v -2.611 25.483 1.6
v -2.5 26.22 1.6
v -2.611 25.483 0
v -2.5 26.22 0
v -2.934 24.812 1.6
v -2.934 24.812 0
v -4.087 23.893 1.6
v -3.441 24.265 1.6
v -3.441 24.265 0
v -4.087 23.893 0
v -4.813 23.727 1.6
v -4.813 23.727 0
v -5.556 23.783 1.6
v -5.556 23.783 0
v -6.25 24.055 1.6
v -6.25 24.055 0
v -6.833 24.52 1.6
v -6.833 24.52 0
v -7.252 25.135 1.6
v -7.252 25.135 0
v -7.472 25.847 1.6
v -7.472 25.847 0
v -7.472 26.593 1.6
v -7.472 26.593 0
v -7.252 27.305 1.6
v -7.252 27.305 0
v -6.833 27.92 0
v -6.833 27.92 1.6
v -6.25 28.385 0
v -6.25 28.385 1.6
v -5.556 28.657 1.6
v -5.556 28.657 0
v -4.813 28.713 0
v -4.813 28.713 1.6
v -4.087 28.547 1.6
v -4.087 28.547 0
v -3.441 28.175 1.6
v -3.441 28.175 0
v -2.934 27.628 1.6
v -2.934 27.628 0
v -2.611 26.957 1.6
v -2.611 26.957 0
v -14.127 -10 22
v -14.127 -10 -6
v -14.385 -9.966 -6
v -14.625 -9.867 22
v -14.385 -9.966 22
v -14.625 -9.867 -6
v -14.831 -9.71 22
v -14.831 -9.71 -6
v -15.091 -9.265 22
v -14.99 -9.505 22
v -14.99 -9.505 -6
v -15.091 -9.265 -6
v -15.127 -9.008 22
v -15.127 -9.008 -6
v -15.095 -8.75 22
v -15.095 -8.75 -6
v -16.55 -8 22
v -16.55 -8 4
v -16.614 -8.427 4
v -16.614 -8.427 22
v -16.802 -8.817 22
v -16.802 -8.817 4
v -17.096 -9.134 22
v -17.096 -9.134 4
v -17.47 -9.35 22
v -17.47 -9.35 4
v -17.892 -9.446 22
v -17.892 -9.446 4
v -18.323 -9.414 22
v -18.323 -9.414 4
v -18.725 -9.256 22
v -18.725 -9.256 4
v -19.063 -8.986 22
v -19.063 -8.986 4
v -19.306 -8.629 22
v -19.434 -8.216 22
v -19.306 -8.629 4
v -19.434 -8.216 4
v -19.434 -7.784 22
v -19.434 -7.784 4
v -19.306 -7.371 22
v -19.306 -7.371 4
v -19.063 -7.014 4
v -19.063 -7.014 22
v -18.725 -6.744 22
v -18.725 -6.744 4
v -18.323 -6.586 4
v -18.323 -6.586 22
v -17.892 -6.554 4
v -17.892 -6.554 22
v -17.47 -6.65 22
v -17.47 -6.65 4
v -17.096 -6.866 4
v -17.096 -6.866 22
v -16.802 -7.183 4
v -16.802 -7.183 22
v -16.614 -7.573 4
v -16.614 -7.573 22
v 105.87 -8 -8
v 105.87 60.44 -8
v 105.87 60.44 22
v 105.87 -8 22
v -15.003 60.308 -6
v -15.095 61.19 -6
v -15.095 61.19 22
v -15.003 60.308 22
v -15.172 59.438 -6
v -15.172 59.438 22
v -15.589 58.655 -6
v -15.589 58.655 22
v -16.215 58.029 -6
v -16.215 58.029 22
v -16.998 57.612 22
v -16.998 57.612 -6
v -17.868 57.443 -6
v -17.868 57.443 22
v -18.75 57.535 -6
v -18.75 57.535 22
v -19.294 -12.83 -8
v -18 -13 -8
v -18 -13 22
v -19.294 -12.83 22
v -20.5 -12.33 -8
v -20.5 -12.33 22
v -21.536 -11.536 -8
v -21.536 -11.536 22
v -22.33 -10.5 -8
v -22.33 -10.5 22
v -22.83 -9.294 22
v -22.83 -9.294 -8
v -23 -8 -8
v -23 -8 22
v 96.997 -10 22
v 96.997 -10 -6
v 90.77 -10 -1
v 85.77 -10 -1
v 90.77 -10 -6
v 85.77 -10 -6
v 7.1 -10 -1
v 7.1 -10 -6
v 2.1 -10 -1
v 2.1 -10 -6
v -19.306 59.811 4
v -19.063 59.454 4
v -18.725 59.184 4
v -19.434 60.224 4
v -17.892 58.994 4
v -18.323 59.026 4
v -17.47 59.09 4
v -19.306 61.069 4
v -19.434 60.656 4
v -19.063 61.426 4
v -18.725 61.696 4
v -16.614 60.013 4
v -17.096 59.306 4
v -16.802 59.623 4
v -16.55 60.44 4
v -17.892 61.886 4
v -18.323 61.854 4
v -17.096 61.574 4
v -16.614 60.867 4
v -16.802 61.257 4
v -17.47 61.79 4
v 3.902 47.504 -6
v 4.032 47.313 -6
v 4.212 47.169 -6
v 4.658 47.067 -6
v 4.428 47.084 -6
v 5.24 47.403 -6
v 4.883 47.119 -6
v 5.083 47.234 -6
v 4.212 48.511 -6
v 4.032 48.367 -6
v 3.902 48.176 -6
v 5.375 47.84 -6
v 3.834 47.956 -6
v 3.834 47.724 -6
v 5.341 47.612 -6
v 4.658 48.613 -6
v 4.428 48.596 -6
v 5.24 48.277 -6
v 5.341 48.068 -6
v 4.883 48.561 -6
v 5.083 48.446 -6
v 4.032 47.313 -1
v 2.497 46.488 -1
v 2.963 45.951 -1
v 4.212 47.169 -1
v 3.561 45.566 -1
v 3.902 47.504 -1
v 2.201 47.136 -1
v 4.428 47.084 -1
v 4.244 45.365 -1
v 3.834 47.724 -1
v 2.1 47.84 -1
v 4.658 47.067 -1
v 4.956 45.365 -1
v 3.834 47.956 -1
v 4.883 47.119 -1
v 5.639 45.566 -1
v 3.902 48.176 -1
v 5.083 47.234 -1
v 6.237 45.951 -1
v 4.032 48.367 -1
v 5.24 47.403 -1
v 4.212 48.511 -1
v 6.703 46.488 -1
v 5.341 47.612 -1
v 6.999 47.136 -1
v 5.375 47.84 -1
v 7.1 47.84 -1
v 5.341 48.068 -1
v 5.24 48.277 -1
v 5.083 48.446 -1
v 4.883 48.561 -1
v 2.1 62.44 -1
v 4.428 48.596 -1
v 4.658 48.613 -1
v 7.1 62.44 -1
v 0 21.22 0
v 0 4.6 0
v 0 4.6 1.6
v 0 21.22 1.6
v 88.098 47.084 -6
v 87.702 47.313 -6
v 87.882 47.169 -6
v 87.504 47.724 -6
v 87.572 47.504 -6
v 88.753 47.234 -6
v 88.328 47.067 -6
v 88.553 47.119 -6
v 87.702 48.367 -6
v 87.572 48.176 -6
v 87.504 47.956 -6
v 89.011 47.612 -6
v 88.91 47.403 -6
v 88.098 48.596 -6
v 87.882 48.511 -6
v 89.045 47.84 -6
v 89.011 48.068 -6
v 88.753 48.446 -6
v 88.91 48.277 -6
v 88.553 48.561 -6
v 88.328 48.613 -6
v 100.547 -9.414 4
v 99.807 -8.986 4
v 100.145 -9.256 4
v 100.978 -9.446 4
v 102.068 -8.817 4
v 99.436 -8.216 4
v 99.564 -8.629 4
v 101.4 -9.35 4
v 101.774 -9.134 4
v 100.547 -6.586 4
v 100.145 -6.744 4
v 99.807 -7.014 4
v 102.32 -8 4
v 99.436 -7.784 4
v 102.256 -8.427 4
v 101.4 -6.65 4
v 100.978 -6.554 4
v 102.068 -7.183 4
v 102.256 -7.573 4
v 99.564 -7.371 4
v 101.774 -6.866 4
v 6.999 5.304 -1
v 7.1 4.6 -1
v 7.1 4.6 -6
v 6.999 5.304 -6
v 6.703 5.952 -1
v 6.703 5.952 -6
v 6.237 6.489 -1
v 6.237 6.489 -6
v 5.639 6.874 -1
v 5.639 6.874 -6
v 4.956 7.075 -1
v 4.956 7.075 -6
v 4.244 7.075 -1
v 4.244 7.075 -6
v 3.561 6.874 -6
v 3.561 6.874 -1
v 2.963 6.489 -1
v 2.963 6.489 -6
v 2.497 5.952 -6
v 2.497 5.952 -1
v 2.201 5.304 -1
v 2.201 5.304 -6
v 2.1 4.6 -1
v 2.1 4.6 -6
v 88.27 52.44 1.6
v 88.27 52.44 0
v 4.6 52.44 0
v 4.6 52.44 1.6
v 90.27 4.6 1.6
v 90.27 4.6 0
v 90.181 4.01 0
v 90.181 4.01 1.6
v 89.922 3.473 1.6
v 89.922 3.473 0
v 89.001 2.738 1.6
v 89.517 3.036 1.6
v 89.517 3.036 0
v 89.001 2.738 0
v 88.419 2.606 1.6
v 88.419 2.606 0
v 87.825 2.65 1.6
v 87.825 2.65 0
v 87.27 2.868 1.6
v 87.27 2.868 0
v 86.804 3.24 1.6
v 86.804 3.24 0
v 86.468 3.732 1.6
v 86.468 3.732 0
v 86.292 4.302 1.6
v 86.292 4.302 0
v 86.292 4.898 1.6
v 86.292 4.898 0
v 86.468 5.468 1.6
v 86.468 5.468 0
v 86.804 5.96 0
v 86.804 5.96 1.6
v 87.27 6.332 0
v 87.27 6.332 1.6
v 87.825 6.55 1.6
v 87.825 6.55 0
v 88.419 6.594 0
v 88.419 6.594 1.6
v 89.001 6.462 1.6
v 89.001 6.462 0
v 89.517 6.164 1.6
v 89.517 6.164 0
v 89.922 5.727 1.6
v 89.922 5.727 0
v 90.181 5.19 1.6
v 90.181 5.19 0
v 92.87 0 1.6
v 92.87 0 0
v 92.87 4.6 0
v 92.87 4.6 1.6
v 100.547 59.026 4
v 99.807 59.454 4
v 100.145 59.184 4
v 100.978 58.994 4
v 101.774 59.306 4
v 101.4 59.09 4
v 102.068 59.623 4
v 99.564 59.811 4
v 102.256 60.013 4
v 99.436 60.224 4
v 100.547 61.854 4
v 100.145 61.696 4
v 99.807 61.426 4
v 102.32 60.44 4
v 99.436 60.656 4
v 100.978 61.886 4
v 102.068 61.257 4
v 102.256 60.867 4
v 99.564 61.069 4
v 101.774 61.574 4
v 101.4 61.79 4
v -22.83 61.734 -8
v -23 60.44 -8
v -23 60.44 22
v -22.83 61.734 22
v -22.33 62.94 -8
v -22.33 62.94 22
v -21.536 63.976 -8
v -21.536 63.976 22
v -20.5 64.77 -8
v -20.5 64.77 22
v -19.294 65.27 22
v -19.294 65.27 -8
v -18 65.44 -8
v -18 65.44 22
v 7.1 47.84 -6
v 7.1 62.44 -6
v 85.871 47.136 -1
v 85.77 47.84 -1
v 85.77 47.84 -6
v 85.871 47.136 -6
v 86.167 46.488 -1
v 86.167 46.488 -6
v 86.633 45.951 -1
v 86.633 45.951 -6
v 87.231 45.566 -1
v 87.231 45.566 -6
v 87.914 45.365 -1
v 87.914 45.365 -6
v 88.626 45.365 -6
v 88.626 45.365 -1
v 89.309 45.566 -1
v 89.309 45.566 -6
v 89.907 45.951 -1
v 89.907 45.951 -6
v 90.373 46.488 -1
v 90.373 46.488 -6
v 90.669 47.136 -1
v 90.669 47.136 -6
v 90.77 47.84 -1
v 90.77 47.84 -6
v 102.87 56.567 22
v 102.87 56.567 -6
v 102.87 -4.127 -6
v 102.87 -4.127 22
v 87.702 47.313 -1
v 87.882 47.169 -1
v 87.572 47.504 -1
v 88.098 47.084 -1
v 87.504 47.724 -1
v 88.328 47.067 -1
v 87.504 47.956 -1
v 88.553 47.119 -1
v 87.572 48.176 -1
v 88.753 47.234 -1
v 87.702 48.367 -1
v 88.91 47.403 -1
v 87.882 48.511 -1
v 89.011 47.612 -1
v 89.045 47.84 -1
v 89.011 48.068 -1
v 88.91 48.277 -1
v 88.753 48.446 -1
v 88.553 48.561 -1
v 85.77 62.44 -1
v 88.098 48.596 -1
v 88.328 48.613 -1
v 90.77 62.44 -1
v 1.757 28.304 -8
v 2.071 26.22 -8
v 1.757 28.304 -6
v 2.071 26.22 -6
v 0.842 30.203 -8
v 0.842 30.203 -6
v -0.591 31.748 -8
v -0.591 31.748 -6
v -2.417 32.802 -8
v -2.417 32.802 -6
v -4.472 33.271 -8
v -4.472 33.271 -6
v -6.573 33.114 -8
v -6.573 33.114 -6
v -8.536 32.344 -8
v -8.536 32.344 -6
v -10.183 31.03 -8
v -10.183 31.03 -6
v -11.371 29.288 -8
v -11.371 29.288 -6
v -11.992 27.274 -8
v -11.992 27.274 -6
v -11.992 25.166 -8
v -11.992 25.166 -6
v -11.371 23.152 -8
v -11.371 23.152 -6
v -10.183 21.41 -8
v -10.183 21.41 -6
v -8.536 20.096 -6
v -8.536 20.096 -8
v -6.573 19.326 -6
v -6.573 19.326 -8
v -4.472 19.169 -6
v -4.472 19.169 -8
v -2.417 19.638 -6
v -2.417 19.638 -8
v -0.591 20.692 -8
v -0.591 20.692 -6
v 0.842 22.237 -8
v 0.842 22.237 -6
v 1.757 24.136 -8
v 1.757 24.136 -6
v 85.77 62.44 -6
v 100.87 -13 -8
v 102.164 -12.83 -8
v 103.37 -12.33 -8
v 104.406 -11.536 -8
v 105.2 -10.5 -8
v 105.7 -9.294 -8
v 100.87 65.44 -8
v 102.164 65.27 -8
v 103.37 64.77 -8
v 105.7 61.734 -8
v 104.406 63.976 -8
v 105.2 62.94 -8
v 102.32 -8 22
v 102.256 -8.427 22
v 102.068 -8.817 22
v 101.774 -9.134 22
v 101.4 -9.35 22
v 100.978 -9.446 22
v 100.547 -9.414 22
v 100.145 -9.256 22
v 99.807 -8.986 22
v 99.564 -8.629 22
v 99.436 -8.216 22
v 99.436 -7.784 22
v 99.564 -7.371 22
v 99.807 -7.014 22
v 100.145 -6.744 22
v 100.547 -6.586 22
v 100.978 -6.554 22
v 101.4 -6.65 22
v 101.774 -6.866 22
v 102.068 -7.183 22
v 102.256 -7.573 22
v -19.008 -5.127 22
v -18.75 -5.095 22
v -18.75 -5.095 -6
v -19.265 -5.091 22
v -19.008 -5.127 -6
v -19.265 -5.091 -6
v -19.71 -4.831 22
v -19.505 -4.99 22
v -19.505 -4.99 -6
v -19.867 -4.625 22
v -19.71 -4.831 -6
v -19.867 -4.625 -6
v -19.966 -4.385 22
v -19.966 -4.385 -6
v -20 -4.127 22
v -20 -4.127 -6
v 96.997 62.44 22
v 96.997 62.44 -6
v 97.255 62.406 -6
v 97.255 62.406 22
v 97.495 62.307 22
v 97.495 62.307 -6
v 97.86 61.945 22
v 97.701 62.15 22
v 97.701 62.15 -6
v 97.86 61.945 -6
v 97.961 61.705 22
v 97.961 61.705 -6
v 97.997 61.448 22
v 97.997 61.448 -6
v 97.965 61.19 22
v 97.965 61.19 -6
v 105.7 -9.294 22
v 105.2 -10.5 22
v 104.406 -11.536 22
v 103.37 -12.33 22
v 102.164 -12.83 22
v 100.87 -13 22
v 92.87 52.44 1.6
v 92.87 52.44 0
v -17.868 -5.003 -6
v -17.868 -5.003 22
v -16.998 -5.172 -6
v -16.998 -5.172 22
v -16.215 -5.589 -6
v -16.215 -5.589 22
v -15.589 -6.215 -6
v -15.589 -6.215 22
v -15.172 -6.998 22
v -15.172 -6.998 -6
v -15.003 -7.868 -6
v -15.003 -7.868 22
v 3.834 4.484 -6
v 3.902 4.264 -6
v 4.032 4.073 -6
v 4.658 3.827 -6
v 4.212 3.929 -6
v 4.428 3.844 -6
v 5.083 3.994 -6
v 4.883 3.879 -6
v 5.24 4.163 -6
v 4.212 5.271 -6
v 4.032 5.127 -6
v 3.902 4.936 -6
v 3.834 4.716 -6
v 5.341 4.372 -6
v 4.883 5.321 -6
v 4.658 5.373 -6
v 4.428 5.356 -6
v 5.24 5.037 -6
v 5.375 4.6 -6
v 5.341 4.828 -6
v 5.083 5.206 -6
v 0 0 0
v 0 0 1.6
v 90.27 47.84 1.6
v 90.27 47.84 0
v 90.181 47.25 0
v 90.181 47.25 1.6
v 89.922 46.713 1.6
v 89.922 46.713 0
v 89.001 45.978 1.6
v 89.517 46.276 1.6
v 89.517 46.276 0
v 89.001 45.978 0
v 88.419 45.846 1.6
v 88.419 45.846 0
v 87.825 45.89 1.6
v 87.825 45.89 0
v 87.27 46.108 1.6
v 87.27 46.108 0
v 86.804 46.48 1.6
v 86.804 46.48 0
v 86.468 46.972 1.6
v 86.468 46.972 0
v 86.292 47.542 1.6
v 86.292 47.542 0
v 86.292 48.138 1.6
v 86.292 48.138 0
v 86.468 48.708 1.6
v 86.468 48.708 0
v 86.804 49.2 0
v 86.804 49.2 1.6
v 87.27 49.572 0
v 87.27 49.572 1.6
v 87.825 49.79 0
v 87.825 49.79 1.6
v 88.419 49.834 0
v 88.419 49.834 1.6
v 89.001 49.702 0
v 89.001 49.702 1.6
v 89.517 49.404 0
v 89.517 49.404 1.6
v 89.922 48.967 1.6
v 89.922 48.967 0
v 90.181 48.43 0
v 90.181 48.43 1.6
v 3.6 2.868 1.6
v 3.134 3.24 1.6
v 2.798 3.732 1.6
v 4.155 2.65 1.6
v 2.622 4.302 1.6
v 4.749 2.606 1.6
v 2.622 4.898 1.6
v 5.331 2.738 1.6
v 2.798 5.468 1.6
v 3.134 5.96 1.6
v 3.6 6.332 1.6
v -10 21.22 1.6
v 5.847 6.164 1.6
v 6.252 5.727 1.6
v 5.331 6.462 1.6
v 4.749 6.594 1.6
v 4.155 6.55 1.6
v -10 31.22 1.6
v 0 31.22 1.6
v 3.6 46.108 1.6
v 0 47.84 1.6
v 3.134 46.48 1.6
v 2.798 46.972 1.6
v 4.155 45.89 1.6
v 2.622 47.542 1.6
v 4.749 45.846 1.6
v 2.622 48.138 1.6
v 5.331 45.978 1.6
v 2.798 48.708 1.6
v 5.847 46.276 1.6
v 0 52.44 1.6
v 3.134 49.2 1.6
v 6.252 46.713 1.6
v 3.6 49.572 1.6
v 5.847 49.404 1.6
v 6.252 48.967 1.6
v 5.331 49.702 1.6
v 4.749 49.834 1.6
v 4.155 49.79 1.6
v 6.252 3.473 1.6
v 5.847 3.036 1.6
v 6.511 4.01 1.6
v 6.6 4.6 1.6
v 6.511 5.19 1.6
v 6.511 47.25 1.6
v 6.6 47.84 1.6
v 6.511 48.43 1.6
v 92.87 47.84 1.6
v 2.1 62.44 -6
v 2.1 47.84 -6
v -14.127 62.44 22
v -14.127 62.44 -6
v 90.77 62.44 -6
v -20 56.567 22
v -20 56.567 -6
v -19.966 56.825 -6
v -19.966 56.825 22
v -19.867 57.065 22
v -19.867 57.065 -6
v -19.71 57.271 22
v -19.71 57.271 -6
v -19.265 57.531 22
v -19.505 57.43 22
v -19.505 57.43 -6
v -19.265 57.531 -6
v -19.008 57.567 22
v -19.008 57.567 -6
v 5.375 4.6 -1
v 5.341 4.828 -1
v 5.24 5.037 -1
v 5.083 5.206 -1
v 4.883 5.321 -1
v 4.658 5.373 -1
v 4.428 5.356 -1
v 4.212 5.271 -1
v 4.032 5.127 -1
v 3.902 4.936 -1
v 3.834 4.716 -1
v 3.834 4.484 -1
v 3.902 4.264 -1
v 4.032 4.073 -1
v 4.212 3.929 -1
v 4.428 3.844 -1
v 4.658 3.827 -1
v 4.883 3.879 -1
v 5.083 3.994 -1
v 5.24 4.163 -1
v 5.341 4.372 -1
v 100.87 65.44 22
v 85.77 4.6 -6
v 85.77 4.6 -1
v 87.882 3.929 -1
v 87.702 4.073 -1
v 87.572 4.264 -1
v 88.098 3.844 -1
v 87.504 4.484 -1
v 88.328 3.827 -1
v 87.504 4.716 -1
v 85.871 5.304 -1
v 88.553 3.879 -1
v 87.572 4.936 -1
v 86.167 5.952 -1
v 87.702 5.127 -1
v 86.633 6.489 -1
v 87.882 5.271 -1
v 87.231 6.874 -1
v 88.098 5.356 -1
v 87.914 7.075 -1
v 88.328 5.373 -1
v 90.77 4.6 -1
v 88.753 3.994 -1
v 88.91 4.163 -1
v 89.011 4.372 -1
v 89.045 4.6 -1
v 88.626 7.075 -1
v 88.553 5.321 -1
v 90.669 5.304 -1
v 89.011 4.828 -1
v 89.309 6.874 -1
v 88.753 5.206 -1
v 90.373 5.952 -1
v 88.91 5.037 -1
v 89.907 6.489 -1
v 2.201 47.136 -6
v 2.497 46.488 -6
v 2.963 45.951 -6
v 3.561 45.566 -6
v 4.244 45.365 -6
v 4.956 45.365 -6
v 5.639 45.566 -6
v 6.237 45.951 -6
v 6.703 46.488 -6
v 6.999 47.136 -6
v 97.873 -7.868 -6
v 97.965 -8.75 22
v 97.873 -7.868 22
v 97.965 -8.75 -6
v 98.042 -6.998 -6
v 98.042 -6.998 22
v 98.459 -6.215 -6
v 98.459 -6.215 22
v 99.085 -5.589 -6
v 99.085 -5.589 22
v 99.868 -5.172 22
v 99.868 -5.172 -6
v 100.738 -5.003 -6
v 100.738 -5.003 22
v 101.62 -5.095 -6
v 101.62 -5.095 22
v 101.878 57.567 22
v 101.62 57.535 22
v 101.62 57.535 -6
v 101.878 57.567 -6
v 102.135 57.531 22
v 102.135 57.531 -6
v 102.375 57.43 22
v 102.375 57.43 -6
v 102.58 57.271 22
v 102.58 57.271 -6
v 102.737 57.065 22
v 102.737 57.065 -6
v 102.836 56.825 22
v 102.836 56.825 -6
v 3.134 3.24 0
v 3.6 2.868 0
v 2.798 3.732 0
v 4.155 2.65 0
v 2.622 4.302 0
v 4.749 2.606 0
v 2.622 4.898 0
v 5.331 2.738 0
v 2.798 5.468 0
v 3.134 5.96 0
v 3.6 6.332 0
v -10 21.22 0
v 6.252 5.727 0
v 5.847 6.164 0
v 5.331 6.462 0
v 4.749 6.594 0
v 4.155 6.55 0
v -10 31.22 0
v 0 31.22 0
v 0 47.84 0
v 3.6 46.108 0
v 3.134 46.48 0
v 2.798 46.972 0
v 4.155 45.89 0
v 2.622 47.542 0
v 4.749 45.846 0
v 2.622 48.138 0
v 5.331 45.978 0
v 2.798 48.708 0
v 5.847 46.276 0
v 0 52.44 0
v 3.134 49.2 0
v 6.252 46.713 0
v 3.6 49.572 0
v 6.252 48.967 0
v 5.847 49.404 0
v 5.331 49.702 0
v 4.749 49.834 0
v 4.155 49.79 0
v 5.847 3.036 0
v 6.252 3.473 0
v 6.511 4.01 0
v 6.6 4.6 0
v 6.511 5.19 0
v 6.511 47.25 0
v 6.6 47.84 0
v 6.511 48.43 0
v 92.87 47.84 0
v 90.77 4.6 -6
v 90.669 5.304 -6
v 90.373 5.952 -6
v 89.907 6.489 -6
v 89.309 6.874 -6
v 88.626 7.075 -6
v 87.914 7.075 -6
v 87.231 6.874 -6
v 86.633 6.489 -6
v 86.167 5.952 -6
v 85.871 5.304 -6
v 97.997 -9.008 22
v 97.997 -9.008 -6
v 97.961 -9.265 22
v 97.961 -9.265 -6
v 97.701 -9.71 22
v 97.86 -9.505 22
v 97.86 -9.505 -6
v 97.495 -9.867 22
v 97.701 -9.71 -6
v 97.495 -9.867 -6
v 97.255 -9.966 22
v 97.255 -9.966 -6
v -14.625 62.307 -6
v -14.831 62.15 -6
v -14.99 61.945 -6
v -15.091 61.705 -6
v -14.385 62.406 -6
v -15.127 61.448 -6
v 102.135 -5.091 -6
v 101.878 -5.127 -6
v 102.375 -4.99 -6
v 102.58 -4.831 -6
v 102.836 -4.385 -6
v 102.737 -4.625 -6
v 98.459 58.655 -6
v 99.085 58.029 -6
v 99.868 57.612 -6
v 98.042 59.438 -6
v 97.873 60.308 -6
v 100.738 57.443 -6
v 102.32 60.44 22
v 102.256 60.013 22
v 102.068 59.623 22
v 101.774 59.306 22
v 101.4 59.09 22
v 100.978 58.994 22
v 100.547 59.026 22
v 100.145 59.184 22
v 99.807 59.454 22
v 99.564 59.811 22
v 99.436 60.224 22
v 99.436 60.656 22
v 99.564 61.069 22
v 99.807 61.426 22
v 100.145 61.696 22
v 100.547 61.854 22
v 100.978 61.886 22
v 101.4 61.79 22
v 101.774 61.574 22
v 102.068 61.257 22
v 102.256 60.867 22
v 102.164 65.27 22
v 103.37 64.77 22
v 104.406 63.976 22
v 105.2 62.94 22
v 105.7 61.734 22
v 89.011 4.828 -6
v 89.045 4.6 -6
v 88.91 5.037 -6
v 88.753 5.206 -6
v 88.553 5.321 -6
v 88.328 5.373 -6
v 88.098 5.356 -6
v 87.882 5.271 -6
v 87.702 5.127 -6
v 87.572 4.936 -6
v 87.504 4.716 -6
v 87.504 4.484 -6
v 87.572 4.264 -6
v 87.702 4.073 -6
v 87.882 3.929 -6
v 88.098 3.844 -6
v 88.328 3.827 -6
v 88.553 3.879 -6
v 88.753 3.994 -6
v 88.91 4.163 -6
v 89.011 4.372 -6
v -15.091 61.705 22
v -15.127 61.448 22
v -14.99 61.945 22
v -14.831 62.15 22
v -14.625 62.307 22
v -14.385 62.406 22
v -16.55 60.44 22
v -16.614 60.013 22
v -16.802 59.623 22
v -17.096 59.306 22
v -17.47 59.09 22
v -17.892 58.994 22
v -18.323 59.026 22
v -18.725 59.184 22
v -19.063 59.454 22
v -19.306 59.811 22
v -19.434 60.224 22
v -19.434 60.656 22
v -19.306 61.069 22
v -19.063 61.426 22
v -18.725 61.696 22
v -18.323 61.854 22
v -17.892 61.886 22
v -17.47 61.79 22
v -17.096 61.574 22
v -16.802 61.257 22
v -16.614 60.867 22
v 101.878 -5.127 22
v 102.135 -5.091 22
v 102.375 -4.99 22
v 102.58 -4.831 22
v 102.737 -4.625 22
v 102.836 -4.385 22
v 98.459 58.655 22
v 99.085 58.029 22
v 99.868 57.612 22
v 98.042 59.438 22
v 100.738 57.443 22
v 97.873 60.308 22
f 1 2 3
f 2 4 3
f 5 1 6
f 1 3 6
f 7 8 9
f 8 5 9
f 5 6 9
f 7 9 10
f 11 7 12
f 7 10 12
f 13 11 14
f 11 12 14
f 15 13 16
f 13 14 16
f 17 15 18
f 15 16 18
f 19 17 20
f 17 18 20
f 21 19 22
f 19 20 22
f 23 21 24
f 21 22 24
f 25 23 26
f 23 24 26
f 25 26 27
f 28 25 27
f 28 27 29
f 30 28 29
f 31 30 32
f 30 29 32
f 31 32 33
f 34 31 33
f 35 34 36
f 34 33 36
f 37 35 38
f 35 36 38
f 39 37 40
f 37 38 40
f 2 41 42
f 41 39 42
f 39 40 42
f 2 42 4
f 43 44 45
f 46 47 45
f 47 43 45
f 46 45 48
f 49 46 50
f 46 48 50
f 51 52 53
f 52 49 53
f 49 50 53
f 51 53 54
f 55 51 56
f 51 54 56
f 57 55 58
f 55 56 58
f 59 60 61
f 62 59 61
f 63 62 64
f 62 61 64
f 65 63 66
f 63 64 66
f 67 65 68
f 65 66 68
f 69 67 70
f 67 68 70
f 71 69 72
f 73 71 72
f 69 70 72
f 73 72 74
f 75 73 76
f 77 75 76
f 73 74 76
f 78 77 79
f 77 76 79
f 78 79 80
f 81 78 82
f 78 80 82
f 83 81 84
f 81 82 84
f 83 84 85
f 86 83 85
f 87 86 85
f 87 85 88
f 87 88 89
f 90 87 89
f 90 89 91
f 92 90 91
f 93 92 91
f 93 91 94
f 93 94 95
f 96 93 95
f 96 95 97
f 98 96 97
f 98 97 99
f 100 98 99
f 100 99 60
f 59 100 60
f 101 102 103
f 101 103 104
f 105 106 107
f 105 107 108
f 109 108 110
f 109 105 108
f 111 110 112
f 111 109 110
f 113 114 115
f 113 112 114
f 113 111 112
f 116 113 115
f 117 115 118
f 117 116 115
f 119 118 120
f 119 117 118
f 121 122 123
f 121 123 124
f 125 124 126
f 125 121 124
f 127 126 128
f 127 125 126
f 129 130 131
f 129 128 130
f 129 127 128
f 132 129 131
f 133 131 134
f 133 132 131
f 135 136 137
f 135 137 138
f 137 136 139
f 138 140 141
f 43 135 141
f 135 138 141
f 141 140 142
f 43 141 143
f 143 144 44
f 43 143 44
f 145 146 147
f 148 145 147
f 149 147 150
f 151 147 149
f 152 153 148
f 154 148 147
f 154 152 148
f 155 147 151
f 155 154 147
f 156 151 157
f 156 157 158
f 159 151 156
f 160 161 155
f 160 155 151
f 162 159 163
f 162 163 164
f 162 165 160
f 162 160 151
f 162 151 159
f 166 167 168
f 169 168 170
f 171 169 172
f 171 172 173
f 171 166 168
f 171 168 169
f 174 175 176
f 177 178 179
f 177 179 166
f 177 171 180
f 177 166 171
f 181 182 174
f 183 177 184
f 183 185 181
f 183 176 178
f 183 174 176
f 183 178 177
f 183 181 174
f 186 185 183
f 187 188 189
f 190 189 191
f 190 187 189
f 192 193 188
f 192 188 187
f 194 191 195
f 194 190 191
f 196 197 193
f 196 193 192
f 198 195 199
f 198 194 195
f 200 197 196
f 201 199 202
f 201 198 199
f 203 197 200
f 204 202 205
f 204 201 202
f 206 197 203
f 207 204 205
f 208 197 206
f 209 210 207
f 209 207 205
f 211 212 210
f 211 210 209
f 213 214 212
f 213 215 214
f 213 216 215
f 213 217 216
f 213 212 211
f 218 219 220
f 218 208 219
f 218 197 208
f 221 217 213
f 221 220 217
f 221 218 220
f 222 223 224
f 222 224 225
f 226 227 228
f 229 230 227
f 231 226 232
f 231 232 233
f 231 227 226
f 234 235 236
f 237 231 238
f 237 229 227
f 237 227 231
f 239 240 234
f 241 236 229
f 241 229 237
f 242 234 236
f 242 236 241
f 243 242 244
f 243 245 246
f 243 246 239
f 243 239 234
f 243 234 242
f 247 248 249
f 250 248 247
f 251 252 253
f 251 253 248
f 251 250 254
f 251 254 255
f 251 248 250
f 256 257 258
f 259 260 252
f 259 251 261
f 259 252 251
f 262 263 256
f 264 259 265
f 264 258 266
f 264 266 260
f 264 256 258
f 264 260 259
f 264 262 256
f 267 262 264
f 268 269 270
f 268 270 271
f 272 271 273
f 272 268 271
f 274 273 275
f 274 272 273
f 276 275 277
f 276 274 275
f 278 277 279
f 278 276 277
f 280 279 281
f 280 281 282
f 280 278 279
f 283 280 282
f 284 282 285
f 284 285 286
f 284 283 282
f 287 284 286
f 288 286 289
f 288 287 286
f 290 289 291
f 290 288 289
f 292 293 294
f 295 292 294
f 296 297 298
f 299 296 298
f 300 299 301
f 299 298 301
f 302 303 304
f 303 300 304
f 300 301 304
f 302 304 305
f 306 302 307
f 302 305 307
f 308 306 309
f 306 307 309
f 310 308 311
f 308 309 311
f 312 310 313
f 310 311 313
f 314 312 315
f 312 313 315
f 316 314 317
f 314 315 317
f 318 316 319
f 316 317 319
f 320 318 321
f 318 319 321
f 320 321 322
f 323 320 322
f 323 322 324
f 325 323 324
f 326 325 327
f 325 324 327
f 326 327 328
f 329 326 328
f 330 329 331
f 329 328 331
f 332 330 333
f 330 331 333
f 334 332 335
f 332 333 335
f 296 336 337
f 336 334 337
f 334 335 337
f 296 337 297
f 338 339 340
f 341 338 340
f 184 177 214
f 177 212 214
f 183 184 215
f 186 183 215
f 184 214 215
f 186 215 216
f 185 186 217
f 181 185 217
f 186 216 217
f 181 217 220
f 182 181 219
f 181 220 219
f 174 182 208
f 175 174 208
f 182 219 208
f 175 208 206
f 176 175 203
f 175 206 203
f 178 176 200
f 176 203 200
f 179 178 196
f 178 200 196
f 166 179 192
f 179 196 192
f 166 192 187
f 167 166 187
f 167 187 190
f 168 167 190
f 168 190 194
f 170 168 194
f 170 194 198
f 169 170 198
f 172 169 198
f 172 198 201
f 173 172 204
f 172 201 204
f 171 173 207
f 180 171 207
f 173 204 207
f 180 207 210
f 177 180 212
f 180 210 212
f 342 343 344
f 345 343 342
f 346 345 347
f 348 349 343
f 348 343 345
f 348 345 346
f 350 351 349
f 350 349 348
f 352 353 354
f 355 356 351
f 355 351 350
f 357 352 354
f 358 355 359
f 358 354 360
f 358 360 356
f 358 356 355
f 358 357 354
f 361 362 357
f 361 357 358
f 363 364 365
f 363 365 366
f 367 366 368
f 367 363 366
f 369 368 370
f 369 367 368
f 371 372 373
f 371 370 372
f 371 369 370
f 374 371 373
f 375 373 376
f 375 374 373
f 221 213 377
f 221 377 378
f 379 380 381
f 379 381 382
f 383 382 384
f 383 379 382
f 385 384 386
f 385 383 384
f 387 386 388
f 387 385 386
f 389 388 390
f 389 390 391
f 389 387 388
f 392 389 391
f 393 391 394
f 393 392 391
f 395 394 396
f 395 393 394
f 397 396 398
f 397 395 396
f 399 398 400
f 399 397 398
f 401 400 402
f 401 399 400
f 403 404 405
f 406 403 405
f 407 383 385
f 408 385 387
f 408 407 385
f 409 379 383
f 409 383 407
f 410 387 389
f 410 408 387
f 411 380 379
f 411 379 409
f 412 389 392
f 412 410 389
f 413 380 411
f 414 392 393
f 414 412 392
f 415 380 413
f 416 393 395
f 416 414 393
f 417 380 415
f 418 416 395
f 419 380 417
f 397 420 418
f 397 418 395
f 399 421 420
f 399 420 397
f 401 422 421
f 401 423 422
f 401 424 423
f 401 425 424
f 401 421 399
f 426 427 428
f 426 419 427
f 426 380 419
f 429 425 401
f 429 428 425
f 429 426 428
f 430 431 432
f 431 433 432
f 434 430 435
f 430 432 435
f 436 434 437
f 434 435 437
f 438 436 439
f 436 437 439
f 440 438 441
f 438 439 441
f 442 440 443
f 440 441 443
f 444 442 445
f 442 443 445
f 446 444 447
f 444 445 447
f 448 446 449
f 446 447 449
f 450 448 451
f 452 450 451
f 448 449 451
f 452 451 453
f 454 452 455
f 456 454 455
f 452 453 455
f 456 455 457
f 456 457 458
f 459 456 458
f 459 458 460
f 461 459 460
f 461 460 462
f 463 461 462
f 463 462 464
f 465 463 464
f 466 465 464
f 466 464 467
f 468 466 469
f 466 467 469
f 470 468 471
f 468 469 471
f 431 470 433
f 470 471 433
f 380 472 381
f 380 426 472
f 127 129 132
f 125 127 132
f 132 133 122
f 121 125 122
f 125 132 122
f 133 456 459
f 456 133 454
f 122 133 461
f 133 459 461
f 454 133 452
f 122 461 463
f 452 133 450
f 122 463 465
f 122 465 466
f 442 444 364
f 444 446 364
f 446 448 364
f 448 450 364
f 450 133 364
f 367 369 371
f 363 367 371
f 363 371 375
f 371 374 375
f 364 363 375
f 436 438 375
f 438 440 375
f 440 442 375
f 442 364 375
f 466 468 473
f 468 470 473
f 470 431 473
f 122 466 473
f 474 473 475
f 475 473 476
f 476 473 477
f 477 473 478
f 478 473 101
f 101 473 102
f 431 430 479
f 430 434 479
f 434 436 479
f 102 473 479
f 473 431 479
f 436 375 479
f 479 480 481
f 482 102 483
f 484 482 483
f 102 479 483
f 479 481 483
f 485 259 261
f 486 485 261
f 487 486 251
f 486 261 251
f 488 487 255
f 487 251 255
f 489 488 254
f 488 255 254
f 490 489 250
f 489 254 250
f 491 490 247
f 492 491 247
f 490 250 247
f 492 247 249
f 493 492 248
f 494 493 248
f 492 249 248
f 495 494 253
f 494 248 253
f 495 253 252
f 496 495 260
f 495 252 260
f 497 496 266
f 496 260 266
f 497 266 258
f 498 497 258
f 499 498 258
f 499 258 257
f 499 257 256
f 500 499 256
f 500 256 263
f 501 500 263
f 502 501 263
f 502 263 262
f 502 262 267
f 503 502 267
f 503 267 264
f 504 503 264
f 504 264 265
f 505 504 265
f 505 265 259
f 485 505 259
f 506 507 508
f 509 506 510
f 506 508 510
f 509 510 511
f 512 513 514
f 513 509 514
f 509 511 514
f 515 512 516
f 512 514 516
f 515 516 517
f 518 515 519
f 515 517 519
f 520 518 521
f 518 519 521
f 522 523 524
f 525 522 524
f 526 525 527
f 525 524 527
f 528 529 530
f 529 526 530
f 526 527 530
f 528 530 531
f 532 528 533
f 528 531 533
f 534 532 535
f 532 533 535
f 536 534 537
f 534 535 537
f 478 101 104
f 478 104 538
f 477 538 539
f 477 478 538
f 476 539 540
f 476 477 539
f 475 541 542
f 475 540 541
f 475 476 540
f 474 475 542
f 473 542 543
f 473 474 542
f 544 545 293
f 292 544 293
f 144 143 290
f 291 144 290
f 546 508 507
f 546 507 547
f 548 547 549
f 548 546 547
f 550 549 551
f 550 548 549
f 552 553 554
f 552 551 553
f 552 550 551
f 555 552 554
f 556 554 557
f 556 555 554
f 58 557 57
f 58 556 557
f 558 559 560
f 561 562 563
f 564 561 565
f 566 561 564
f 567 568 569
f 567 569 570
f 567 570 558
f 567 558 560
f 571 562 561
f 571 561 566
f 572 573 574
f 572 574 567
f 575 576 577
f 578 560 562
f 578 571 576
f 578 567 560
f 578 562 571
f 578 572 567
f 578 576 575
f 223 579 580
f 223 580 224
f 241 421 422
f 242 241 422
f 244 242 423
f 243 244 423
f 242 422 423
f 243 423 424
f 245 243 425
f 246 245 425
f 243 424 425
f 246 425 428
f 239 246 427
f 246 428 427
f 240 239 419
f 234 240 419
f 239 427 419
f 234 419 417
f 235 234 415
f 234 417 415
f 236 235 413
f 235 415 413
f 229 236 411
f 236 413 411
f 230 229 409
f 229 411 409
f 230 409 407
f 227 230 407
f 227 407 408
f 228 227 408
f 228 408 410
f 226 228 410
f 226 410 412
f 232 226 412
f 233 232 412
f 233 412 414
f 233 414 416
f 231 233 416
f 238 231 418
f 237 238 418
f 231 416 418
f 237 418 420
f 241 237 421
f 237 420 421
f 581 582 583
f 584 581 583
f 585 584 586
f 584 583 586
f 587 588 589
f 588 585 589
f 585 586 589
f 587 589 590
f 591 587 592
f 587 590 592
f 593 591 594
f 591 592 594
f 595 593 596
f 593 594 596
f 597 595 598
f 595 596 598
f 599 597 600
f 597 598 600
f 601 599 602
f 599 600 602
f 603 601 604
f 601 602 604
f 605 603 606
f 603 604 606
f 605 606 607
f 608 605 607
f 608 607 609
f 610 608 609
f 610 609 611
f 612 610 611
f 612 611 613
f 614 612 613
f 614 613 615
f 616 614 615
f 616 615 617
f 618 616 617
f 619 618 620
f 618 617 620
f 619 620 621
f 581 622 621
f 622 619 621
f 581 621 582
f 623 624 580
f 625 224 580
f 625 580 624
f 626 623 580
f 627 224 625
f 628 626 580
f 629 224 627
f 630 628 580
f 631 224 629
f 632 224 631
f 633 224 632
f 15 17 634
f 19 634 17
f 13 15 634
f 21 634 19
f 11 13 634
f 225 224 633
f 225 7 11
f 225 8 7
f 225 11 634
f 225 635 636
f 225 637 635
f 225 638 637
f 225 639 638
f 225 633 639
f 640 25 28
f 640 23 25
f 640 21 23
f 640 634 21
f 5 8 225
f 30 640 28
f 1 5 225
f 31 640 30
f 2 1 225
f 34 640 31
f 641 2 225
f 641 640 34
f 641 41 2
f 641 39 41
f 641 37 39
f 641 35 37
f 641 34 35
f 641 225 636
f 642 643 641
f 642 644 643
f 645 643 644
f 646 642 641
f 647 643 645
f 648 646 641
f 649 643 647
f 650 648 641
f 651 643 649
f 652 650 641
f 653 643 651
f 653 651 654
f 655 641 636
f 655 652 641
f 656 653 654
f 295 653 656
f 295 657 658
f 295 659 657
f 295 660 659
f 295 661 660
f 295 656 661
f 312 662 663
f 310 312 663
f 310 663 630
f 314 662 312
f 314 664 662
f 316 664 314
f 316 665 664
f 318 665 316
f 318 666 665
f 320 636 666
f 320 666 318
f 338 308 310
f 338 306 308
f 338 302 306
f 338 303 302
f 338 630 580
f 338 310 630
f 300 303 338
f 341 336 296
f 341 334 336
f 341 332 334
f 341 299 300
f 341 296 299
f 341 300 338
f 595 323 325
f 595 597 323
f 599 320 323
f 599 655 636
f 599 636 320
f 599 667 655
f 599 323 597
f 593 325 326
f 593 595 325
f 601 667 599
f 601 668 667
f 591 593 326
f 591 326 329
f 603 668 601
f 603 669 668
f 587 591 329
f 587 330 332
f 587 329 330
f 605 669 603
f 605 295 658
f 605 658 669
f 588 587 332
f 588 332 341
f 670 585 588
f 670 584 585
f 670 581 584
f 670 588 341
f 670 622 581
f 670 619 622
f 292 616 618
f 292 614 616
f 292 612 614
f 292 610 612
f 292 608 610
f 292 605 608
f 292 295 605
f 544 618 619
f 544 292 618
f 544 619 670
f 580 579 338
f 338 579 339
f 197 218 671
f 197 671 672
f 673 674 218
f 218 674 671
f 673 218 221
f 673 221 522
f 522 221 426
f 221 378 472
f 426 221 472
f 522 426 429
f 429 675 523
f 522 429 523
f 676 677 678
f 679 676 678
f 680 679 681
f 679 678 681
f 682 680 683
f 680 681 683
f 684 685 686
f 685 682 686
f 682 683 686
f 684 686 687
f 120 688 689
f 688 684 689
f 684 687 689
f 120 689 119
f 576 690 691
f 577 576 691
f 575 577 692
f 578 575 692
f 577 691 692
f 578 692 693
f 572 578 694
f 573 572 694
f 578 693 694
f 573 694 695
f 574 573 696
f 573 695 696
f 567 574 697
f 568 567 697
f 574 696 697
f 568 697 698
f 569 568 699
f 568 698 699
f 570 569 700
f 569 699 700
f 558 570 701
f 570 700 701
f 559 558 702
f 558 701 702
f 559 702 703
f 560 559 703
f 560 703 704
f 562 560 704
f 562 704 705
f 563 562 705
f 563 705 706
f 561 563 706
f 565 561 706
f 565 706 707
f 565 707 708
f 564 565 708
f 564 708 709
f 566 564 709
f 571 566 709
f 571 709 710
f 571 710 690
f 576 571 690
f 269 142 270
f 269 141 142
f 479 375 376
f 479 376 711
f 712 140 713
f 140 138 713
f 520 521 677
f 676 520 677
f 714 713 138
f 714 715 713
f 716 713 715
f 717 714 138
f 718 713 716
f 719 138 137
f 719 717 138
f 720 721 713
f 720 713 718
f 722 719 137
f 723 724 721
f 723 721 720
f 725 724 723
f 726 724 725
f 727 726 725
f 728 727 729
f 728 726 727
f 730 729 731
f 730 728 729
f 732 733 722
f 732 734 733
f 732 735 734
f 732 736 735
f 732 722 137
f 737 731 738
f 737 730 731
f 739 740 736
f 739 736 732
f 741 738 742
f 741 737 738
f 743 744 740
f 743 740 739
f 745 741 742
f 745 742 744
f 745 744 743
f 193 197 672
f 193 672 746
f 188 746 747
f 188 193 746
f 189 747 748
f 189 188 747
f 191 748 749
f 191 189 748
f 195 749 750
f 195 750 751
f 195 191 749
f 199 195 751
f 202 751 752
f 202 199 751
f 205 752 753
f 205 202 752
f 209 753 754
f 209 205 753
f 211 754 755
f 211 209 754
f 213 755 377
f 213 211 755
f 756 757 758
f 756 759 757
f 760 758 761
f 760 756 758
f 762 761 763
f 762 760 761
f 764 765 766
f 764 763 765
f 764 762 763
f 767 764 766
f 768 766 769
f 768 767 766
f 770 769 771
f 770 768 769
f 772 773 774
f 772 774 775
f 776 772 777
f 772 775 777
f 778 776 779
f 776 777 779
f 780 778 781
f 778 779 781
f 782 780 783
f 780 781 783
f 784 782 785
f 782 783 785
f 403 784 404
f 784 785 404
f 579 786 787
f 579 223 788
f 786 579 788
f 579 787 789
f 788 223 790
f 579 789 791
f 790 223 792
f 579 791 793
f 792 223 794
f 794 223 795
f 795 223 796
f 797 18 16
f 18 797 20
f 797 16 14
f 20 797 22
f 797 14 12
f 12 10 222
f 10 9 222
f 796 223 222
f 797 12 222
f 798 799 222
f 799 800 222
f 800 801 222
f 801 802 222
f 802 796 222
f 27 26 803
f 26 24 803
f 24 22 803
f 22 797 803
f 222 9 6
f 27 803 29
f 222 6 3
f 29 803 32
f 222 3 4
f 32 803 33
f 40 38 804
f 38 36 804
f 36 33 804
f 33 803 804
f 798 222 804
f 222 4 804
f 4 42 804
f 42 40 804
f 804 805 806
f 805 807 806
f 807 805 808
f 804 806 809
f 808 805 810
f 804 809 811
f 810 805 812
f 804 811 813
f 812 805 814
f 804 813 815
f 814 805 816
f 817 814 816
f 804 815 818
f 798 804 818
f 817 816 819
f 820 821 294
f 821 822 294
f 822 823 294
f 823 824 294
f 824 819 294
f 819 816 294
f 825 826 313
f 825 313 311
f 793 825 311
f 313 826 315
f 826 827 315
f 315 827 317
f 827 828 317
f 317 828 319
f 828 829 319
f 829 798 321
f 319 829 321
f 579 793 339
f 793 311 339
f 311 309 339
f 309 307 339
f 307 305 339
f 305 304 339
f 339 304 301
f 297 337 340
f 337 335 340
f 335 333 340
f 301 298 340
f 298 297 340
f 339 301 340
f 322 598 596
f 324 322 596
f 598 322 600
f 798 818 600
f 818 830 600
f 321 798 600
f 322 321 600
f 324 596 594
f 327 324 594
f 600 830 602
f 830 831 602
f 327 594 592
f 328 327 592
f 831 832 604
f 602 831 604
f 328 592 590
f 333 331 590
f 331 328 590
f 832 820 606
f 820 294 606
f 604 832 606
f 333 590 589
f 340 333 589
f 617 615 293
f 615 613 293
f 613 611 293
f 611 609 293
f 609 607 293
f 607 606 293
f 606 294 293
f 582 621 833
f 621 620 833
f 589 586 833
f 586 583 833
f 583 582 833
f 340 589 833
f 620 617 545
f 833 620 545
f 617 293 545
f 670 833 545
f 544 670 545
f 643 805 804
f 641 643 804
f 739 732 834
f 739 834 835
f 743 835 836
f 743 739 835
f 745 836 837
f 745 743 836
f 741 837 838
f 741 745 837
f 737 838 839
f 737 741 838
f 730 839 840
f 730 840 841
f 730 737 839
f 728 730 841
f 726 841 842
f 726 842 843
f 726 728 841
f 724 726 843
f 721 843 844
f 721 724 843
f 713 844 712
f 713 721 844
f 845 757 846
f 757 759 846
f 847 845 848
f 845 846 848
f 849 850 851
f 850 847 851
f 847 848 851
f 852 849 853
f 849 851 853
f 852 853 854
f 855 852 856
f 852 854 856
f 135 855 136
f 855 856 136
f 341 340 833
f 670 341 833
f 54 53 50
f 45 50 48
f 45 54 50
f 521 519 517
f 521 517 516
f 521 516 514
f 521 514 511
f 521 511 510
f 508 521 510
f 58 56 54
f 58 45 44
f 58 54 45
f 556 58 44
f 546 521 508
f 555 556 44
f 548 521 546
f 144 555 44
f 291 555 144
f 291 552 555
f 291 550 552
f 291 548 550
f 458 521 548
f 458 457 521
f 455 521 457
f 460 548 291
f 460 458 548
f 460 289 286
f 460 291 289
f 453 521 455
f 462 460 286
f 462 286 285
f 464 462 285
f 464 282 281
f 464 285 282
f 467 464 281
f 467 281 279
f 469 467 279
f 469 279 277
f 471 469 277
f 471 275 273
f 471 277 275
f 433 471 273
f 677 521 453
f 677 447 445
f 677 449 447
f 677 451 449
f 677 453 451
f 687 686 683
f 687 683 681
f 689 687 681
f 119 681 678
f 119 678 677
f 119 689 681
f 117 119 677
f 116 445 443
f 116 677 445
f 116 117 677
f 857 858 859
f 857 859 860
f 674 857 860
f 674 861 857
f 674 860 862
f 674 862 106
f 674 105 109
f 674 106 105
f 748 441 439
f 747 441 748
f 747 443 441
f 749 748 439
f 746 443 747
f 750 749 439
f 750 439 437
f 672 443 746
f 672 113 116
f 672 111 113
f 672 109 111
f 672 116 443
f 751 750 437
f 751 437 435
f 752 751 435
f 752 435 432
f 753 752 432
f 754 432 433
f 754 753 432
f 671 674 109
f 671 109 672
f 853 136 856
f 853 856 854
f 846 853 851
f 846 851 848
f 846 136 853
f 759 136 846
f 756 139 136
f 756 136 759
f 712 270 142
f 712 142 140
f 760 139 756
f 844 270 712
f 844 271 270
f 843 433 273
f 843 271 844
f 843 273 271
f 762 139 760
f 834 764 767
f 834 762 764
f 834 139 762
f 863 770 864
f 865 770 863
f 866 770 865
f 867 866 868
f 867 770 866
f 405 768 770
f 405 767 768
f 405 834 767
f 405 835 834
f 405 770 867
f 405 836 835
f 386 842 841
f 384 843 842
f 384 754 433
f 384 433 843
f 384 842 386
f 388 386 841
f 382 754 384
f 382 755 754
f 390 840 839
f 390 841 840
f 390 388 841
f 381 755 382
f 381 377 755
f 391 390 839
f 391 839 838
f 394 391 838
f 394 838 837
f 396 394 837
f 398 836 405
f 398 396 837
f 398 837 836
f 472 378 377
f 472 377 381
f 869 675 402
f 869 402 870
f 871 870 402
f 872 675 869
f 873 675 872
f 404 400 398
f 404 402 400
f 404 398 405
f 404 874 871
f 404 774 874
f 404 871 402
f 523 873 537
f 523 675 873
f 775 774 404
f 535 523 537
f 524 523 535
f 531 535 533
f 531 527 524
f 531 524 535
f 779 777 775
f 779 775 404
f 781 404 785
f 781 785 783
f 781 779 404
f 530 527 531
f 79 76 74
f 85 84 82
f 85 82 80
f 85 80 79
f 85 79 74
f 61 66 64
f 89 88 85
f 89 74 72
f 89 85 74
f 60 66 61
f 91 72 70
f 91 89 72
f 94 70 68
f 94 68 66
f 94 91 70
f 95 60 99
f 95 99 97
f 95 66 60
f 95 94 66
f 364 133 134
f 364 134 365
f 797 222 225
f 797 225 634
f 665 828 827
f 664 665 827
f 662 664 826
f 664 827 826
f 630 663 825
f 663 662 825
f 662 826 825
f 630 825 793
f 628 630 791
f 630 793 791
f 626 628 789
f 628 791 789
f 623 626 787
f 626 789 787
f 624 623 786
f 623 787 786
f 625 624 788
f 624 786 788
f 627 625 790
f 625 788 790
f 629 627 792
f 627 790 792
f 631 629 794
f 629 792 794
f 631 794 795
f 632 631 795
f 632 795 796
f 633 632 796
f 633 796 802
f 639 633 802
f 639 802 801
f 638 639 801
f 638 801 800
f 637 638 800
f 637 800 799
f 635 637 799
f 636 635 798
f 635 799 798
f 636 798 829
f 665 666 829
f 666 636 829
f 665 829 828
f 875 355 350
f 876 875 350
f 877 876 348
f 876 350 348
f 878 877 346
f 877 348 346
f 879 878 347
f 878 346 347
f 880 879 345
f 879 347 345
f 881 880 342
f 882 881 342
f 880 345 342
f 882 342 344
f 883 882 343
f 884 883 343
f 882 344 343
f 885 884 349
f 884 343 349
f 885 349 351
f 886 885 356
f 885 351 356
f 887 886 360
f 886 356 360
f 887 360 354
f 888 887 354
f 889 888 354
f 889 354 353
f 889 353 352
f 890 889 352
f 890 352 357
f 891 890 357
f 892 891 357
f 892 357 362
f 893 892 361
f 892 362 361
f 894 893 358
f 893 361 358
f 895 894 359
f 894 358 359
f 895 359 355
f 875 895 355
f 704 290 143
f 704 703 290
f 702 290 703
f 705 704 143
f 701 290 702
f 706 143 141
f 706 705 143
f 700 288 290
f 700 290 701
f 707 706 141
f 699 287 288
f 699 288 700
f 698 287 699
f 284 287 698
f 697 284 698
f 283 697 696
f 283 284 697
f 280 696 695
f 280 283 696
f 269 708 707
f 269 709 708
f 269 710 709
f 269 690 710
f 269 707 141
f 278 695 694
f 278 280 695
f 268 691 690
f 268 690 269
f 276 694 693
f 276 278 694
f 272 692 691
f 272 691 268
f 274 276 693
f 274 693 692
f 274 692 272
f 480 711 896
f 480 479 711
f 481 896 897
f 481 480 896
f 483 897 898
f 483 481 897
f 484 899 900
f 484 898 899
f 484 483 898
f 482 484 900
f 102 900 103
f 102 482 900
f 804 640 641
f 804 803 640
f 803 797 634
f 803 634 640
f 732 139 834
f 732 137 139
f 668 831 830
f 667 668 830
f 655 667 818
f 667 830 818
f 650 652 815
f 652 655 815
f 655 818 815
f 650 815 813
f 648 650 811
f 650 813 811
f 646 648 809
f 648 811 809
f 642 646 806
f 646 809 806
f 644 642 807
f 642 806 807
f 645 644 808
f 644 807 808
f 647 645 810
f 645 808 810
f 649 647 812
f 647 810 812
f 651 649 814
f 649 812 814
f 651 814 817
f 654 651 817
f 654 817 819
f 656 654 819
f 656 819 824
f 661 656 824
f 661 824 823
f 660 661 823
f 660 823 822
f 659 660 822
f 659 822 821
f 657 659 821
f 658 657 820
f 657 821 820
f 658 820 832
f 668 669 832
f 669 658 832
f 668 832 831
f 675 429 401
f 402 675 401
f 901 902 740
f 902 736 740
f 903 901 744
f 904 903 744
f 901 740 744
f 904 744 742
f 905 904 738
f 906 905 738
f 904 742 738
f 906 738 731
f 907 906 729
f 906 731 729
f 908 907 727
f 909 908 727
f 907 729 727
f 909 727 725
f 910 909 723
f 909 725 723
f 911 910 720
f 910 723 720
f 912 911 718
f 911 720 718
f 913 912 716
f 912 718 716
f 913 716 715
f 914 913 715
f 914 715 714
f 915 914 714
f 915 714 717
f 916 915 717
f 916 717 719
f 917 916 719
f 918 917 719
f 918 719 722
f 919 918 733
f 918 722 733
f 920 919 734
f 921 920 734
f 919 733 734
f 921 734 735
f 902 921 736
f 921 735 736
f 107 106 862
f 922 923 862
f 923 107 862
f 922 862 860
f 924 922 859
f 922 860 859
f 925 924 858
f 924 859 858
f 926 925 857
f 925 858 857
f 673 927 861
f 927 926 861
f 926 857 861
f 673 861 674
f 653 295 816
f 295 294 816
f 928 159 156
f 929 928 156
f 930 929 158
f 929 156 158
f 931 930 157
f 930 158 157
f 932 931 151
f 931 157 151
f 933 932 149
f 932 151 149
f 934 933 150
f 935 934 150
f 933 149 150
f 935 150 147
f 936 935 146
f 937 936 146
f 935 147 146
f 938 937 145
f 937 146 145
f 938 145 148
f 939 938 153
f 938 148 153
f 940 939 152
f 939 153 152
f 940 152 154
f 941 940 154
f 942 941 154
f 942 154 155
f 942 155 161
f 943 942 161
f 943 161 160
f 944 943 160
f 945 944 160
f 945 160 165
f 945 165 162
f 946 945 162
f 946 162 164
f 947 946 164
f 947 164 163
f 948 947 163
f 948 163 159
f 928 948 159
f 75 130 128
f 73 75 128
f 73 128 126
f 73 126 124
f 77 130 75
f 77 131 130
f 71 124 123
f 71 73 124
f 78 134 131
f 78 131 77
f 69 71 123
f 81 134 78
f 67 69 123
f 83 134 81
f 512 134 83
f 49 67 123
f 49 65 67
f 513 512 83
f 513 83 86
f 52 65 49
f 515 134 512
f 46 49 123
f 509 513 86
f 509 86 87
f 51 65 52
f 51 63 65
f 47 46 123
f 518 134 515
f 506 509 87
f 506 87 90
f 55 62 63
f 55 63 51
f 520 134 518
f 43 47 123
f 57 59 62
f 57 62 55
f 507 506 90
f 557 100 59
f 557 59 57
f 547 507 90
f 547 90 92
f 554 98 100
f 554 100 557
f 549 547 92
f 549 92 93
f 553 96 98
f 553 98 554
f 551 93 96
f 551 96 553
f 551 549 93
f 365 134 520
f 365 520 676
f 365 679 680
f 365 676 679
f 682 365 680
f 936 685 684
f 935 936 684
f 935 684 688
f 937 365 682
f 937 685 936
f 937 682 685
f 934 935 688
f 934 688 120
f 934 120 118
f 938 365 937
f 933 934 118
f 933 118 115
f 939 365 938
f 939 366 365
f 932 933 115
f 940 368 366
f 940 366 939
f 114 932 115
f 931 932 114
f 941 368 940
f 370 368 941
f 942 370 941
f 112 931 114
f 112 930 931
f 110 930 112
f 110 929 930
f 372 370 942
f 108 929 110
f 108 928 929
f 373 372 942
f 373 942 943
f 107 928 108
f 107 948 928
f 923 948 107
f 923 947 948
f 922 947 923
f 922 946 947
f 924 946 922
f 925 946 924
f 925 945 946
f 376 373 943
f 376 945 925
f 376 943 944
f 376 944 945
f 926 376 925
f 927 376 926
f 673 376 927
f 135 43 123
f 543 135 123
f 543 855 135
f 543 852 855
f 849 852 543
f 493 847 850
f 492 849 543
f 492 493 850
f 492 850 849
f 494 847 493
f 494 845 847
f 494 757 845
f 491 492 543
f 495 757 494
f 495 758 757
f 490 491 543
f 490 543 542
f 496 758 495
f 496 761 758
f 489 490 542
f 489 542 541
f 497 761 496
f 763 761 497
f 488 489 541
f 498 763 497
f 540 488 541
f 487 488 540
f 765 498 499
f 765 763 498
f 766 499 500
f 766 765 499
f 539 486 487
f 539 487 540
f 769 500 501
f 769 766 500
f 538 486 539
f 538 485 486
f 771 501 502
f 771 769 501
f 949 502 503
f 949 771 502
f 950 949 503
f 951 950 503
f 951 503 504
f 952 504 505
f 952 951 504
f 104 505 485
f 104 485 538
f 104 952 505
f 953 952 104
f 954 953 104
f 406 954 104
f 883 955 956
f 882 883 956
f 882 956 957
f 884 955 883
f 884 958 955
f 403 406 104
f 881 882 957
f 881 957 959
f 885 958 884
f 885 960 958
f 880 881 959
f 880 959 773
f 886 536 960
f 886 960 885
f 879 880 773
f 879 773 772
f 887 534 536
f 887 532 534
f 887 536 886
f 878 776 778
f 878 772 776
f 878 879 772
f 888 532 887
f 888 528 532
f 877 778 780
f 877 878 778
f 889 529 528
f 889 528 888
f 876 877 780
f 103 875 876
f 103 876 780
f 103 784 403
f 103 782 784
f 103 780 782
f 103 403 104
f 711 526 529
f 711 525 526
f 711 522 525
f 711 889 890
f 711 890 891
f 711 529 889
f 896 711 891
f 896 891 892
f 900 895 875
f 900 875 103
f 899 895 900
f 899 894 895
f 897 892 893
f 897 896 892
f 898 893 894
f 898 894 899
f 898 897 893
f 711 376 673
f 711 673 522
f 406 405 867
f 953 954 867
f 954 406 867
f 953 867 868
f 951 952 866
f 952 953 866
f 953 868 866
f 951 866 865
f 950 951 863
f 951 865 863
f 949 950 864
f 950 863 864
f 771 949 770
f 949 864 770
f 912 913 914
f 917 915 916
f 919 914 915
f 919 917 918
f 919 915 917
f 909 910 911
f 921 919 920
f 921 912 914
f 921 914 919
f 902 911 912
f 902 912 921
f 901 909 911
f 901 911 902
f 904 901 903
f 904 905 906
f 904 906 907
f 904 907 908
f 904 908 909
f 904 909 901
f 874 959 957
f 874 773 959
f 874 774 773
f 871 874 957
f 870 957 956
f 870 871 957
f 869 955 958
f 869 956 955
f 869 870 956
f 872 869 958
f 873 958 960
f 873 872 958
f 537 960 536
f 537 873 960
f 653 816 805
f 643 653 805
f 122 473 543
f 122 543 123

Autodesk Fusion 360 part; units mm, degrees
sketch "PCB" plane through (0, 0, 0) normal (0, 0, 1) x (1, 0, 0)
  line L0 (0, 0) -> (92.87, 0)
  line L1 (92.87, 0) -> (92.87, 52.44)
  line L2 (92.87, 52.44) -> (0, 52.44)
  line L3 (0, 0) -> (0, 21.22)
  line L4 (0, 52.44) -> (0, 31.22)
  line L5 (0, 21.22) -> (-10, 21.22)
  line L6 (-10, 21.22) -> (-10, 31.22)
  line L7 (-10, 31.22) -> (0, 31.22)
  line L8 (0, 52.44) -> (0, 31.22)
  line L9 (0, 21.22) -> (0, 0)
  circle A0 centre (-5, 26.22) radius 2.5
  line L10 (0, 52.44) -> (4.6, 52.44)
  line L11 (0, 52.44) -> (0, 47.84)
  circle A1 centre (4.6, 47.84) radius 2
  line L12 (92.87, 52.44) -> (88.27, 52.44)
  line L13 (92.87, 52.44) -> (92.87, 47.84)
  circle A2 centre (88.27, 47.84) radius 2
  line L14 (92.87, 0) -> (92.87, 4.6)
  circle A3 centre (88.27, 4.6) radius 2
  line L15 (0, 0) -> (0, 4.6)
  circle A4 centre (4.6, 4.6) radius 2
  dimension "d8" = 92.87
  dimension "d9" = 52.44
  dimension "d10" = 21.22
  dimension "d11" = 21.22
  dimension "d12" = 10
  dimension "d13" = 5
  dimension "d14" = 4.6
  dimension "d15" = 4.6
  dimension "d16" = 4
  dimension "d17" = 4.6
  dimension "d18" = 4.6
  dimension "d19" = 4
  dimension "d20" = 4.6
  dimension "d21" = 4
  dimension "d22" = 4.6
  dimension "d23" = 4
extrude "Extrude1" add sketch "PCB" along normal blind 1.6 makes body 1
sketch "PCB BOX" plane through (0, 0, 0) normal (0, 0, 1) x (1, 0, 0)
  line L0 (-14.127, 62.44) -> (96.997, 62.44)
  line L1 (102.87, 56.567) -> (102.87, -4.127)
  line L2 (96.997, -10) -> (-14.127, -10)
  line L3 (-20, -4.127) -> (-20, 56.567)
  line L4 (92.87, 52.44) -> (0, 52.44)
  line L5 (92.87, 0) -> (92.87, 52.44)
  line L6 (0, 0) -> (92.87, 0)
  line L7 (-10, 31.22) -> (-10, 21.22)
  line L8 (105.87, 60.44) -> (105.87, -8)
  arc A0 (100.87, -13) -> (105.87, -8) centre (100.87, -8) ccw
  line L9 (100.87, -13) -> (-18, -13)
  arc A1 (-23, -8) -> (-18, -13) centre (-18, -8) ccw
  line L10 (-23, -8) -> (-23, 60.44)
  arc A2 (-18, 65.44) -> (-23, 60.44) centre (-18, 60.44) ccw
  line L11 (-18, 65.44) -> (100.87, 65.44)
  arc A3 (105.87, 60.44) -> (100.87, 65.44) centre (100.87, 60.44) ccw
  circle A4 centre (-18, 60.44) radius 1.45
  arc A5 (-18.75, 57.5353) -> (-15.0953, 61.19) centre (-18, 60.44) ccw
  arc A6 (-18.75, 57.5353) -> (-20, 56.567) centre (-19, 56.567) ccw
  arc A7 (-14.127, 62.44) -> (-15.0953, 61.19) centre (-14.127, 61.44) ccw
  circle A8 centre (-18, -8) radius 1.45
  arc A9 (-15.0953, -8.75) -> (-18.75, -5.0953) centre (-18, -8) ccw
  arc A10 (-20, -4.127) -> (-18.75, -5.0953) centre (-19, -4.127) ccw
  arc A11 (-15.0953, -8.75) -> (-14.127, -10) centre (-14.127, -9) ccw
  circle A12 centre (100.87, 60.44) radius 1.45
  arc A13 (97.9653, 61.19) -> (101.62, 57.5353) centre (100.87, 60.44) ccw
  arc A14 (97.9653, 61.19) -> (96.997, 62.44) centre (96.997, 61.44) ccw
  arc A15 (102.87, 56.567) -> (101.62, 57.5353) centre (101.87, 56.567) ccw
  circle A16 centre (100.87, -8) radius 1.45
  arc A17 (101.62, -5.0953) -> (97.9653, -8.75) centre (100.87, -8) ccw
  arc A18 (96.997, -10) -> (97.9653, -8.75) centre (96.997, -9) ccw
  arc A19 (101.62, -5.0953) -> (102.87, -4.127) centre (101.87, -4.127) ccw
  circle A20 centre (88.27, 47.84) radius 2
  circle A21 centre (-5, 26.22) radius 2.5
  circle A22 centre (88.27, 4.6) radius 2
  circle A23 centre (4.6, 4.6) radius 2
  circle A24 centre (4.6, 47.84) radius 2
  line L12 (92.87, 0) -> (92.87, 52.44)
  line L13 (92.87, 52.44) -> (0, 52.44)
  line L14 (0, 52.44) -> (0, 31.22)
  line L15 (0, 31.22) -> (-10, 31.22)
  line L16 (-10, 31.22) -> (-10, 21.22)
  line L17 (-10, 21.22) -> (0, 21.22)
  line L18 (0, 21.22) -> (0, 0)
  line L19 (0, 0) -> (92.87, 0)
  circle A25 centre (4.6, 47.84) radius 0.775
  circle A26 centre (88.27, 47.84) radius 0.775
  circle A27 centre (4.6, 4.6) radius 0.775
  circle A28 centre (88.27, 4.6) radius 0.775
  circle A29 centre (4.6, 4.6) radius 2.5
  circle A30 centre (4.6, 47.84) radius 2.5
  circle A31 centre (88.27, 47.84) radius 2.5
  circle A32 centre (88.27, 4.6) radius 2.5
  line L20 (7.1, 47.84) -> (7.1, 62.44)
  line L21 (2.1, 62.44) -> (2.1, 47.84)
  line L22 (102.87, 50.34) -> (102, 50.34)
  line L23 (85.77, -10) -> (85.77, 4.6)
  line L24 (90.77, -10) -> (90.77, 4.6)
  line L25 (2.1, -10) -> (2.1, 4.6)
  line L26 (7.1, -10) -> (7.1, 4.6)
  line L27 (85.77, 62.44) -> (85.77, 47.84)
  line L28 (90.77, 62.44) -> (90.77, 47.84)
  circle A33 centre (-18, 60.44) radius 1.125
  circle A34 centre (100.87, 60.44) radius 1.125
  circle A35 centre (-18, -8) radius 1.125
  circle A36 centre (100.87, -8) radius 1.125
  circle A37 centre (-5, 26.22) radius 7.0711
  dimension "d26" = 10
  dimension "d27" = 10
  dimension "d28" = 10
  dimension "d29" = 10
  dimension "d32" = 2.9
  dimension "d33" = 6
  dimension "d34" = 1
  dimension "d35" = 2.9
  dimension "d36" = 6
  dimension "d37" = 1
  dimension "d38" = 2.9
  dimension "d39" = 6
  dimension "d40" = 1
  dimension "d41" = 2.9
  dimension "d42" = 6
  dimension "d43" = 1
  dimension "d53" = 1.55
  dimension "d54" = 1.55
  dimension "d55" = 1.55
  dimension "d56" = 1.55
  dimension "d57" = 5
  dimension "d58" = 5
  dimension "d59" = 5
  dimension "d60" = 5
  dimension "d64" = 2.25
  dimension "d65" = 2.25
  dimension "d66" = 2.25
  dimension "d67" = 2.25
extrude "Extrude2" add sketch "PCB BOX" along normal blind 2 from surface at -8 separate body contours L0 L2 L3 L4 L6 A5 A6 A7 A9 A10 A11 L13 L14 L18 L19 L21 L25 A37 | L0 L4 L13 L20 L21 | L0 L4 L13 L20 L27 | L4 L5 L6 L12 L13 L14 L18 L19 A29 A30 A31 A32 L20 L21 L23 L24 L25 L26 L27 L28 A37 | L4 L13 A30 L20 L21 | L0 L4 L13 L27 L28 | A30 | L0 L1 L2 L4 L5 L6 A13 A14 A15 A17 A18 A19 L12 L13 L19 L24 L28 | L4 L13 A31 L27 L28 | L7 L15 L16 L17 A37 | L15 A37 | A31 | L7 L16 A37 | L17 A37 | L2 L6 L19 L23 L24 | L6 L19 A32 L23 L24 | L6 L19 A29 L25 L26 | L2 L6 L19 L25 L26 | L2 L6 L19 L23 L26 | A32 | A29 | A20 | A21 | A22 | A23 | A24 | A25 | A26 | A27 | A28 makes body 2
extrude "Extrude3" add sketch "PCB BOX" along normal blind 30 from surface at -8 contours L8 A0 L9 A1 L10 A2 L11 A3 | A4 | A8 | A12 | A16 | A33 | A34 | A35 | A36 bodies 2
extrude "Extrude4" cut sketch "PCB BOX" along normal blind 40 from surface at 4 contours A4 | A8 | A12 | A16 | A33 | A34 | A35 | A36 bodies 2
extrude "Extrude5" add sketch "PCB BOX" against normal blind 5 from surface at -1 contours L0 L4 L13 L20 L21 | L4 L13 A30 L20 L21 | L0 L4 L13 L27 L28 | A30 | L4 L13 A31 L27 L28 | A31 | L2 L6 L19 L23 L24 | L6 L19 A32 L23 L24 | L6 L19 A29 L25 L26 | L2 L6 L19 L25 L26 | A32 | A29 | A20 | A22 | A23 | A24 bodies 2
extrude "Extrude6" add sketch "PCB BOX" along normal blind 7 from surface at 30 separate body contours L0 L2 L3 L4 L6 A5 A6 A7 A9 A10 A11 L13 L14 L18 L19 L21 L25 A37 | L0 L4 L13 L20 L21 | L0 L4 L13 L20 L27 | L4 L5 L6 L12 L13 L14 L18 L19 A29 A30 A31 A32 L20 L21 L23 L24 L25 L26 L27 L28 A37 | L4 L13 A30 L20 L21 | L0 L4 L13 L27 L28 | A30 | L0 L1 L2 L4 L5 L6 A13 A14 A15 A17 A18 A19 L12 L13 L19 L24 L28 | L4 L13 A31 L27 L28 | L7 L15 L16 L17 A37 | L15 A37 | A31 | L7 L16 A37 | L17 A37 | L2 L6 L19 L23 L24 | L6 L19 A32 L23 L24 | L6 L19 A29 L25 L26 | L2 L6 L19 L25 L26 | L2 L6 L19 L23 L26 | A32 | A29 | L8 A0 L9 A1 L10 A2 L11 A3 | A4 | A8 | A12 | A16 | A20 | A21 | A22 | A23 | A24 | A25 | A26 | A27 | A28 makes body 3
extrude "Extrude7" cut sketch "PCB BOX" along normal blind 40 from surface at 10 contours L7 L15 L16 L17 A37 | L15 A37 | L7 L16 A37 | L17 A37 | A21 bodies 3
extrude "Extrude8" cut sketch "PCB BOX" against normal blind 20 from surface at -2 contours L7 L15 L16 L17 A37 | L15 A37 | L7 L16 A37 | L17 A37 | A21 bodies 2
hidden bodies 3
